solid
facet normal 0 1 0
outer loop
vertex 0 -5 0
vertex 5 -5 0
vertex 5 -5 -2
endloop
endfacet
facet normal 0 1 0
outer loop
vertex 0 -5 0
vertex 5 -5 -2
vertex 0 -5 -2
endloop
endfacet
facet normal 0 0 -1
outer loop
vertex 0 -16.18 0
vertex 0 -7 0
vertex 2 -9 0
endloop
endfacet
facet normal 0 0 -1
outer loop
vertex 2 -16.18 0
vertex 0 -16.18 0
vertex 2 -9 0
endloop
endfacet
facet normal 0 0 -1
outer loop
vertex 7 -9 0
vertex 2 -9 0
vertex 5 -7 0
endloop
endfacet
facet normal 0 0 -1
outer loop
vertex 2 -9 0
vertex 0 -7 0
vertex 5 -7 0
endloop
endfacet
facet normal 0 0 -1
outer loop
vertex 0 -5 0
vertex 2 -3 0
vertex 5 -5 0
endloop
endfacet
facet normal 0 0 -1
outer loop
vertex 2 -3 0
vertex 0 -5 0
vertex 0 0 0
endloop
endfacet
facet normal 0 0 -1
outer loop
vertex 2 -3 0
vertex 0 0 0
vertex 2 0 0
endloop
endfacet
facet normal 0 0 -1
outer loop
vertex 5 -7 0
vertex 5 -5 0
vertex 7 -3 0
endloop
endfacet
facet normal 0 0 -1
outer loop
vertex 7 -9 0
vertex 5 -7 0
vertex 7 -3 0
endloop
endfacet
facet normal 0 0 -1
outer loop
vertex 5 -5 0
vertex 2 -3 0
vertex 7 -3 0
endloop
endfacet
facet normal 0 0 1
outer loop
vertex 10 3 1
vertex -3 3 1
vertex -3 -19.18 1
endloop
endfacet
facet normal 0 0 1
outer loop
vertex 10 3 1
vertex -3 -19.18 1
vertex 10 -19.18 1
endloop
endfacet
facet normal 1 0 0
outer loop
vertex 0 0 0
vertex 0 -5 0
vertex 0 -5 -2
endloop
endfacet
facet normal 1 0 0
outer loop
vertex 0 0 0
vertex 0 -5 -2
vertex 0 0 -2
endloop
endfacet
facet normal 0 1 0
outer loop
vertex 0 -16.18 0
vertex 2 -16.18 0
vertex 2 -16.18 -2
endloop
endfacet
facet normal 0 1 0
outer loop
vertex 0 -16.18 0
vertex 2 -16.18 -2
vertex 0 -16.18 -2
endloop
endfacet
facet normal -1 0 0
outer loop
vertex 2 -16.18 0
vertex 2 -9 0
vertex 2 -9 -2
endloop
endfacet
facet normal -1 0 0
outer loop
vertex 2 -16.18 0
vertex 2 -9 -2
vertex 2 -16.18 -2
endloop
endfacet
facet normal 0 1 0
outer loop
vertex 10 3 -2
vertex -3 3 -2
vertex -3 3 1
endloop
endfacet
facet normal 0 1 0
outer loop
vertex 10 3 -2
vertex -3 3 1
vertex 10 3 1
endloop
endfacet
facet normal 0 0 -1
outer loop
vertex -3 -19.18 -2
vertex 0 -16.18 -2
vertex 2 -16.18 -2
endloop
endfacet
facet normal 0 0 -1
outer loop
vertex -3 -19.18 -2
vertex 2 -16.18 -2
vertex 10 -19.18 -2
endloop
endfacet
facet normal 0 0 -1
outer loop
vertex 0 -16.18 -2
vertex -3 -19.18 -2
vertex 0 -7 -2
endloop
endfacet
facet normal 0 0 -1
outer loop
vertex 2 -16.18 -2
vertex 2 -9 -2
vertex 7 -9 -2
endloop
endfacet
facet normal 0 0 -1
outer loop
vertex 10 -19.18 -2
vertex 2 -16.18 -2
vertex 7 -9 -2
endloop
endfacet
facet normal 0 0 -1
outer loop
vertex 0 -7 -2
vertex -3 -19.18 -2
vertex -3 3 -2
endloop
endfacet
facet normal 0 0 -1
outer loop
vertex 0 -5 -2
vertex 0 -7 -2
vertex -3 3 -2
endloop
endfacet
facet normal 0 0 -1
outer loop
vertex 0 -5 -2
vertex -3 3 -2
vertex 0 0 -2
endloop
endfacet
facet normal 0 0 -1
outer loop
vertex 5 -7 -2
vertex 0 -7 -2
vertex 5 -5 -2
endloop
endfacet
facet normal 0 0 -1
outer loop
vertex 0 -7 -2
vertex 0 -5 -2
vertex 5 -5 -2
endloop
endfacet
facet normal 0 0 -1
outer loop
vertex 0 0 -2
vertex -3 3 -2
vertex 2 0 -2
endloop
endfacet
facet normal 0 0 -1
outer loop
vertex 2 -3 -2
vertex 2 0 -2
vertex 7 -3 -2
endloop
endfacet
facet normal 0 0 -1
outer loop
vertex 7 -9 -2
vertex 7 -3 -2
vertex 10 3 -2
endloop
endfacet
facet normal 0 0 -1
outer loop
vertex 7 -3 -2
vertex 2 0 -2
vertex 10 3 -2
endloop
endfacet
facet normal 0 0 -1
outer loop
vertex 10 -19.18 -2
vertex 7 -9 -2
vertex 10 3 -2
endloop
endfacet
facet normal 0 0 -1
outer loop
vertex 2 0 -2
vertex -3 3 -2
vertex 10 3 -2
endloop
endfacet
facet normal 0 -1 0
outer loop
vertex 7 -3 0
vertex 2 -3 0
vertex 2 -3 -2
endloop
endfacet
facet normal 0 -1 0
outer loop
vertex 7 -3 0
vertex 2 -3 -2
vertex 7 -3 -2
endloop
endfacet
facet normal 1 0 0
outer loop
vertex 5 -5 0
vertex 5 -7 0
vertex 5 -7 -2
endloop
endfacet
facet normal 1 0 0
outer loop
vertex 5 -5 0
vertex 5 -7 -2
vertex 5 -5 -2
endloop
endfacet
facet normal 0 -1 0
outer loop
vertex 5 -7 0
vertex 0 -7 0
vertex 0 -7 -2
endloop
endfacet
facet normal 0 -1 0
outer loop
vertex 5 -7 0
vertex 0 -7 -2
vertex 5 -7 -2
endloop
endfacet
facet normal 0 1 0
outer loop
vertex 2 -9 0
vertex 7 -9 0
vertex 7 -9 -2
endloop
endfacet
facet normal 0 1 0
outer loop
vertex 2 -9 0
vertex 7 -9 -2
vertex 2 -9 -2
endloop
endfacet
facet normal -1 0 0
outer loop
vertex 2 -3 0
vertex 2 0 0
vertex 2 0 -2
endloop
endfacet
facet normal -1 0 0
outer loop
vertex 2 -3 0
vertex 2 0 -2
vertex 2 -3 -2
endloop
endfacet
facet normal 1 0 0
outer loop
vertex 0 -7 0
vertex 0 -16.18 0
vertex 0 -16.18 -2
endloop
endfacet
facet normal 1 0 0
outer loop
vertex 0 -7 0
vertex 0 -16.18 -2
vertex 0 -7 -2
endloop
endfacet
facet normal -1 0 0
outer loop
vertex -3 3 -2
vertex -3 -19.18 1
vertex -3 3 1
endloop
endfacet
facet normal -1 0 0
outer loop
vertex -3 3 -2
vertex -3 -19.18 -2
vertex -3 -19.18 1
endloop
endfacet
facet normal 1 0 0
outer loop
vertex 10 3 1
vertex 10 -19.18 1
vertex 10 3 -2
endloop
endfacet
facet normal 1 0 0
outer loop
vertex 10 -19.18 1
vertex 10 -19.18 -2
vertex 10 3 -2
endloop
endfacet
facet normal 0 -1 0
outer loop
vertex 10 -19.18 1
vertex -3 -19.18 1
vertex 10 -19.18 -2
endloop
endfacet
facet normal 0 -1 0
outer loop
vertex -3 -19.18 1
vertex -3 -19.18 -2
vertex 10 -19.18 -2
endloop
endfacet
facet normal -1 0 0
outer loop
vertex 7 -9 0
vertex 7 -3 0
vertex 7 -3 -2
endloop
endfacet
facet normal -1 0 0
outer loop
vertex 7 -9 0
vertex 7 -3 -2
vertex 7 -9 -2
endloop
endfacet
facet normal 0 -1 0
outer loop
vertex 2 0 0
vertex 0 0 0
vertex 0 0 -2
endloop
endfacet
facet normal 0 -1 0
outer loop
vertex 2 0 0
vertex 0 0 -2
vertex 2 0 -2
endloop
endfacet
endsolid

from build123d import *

# Parameters (mm, degrees)
SKETCH_1_W      = 13
SKETCH_1_H      = 22.18
EXTRUDE_1_DEPTH = 2
SKETCH_2_W      = 13
SKETCH_2_H      = 22.18
EXTRUDE_3_DEPTH = 1


with BuildPart() as part:
    # 草图1 → 凸台-拉伸1 (new body)
    with BuildSketch(Plane.XY):
        with Locations((3.5, -8.09)):
            Rectangle(SKETCH_1_W, SKETCH_1_H)
        Polygon((0, -5), (0, 0), (2, 0), (2, -3), (7, -3), (7, -5), (7, -9), (5, -9), (2, -9), (2, -16.18), (0, -16.18), (0, -9), (0, -7), (5, -7), (5, -5), (2, -5), align=None, mode=Mode.SUBTRACT)
    extrude(amount=-EXTRUDE_1_DEPTH)

    # 草图2 → 凸台-拉伸3 (add)
    with BuildSketch(Plane.XY):
        with Locations((3.5, -8.09)):
            Rectangle(SKETCH_2_W, SKETCH_2_H)
    extrude(amount=EXTRUDE_3_DEPTH)


solid = part.part
